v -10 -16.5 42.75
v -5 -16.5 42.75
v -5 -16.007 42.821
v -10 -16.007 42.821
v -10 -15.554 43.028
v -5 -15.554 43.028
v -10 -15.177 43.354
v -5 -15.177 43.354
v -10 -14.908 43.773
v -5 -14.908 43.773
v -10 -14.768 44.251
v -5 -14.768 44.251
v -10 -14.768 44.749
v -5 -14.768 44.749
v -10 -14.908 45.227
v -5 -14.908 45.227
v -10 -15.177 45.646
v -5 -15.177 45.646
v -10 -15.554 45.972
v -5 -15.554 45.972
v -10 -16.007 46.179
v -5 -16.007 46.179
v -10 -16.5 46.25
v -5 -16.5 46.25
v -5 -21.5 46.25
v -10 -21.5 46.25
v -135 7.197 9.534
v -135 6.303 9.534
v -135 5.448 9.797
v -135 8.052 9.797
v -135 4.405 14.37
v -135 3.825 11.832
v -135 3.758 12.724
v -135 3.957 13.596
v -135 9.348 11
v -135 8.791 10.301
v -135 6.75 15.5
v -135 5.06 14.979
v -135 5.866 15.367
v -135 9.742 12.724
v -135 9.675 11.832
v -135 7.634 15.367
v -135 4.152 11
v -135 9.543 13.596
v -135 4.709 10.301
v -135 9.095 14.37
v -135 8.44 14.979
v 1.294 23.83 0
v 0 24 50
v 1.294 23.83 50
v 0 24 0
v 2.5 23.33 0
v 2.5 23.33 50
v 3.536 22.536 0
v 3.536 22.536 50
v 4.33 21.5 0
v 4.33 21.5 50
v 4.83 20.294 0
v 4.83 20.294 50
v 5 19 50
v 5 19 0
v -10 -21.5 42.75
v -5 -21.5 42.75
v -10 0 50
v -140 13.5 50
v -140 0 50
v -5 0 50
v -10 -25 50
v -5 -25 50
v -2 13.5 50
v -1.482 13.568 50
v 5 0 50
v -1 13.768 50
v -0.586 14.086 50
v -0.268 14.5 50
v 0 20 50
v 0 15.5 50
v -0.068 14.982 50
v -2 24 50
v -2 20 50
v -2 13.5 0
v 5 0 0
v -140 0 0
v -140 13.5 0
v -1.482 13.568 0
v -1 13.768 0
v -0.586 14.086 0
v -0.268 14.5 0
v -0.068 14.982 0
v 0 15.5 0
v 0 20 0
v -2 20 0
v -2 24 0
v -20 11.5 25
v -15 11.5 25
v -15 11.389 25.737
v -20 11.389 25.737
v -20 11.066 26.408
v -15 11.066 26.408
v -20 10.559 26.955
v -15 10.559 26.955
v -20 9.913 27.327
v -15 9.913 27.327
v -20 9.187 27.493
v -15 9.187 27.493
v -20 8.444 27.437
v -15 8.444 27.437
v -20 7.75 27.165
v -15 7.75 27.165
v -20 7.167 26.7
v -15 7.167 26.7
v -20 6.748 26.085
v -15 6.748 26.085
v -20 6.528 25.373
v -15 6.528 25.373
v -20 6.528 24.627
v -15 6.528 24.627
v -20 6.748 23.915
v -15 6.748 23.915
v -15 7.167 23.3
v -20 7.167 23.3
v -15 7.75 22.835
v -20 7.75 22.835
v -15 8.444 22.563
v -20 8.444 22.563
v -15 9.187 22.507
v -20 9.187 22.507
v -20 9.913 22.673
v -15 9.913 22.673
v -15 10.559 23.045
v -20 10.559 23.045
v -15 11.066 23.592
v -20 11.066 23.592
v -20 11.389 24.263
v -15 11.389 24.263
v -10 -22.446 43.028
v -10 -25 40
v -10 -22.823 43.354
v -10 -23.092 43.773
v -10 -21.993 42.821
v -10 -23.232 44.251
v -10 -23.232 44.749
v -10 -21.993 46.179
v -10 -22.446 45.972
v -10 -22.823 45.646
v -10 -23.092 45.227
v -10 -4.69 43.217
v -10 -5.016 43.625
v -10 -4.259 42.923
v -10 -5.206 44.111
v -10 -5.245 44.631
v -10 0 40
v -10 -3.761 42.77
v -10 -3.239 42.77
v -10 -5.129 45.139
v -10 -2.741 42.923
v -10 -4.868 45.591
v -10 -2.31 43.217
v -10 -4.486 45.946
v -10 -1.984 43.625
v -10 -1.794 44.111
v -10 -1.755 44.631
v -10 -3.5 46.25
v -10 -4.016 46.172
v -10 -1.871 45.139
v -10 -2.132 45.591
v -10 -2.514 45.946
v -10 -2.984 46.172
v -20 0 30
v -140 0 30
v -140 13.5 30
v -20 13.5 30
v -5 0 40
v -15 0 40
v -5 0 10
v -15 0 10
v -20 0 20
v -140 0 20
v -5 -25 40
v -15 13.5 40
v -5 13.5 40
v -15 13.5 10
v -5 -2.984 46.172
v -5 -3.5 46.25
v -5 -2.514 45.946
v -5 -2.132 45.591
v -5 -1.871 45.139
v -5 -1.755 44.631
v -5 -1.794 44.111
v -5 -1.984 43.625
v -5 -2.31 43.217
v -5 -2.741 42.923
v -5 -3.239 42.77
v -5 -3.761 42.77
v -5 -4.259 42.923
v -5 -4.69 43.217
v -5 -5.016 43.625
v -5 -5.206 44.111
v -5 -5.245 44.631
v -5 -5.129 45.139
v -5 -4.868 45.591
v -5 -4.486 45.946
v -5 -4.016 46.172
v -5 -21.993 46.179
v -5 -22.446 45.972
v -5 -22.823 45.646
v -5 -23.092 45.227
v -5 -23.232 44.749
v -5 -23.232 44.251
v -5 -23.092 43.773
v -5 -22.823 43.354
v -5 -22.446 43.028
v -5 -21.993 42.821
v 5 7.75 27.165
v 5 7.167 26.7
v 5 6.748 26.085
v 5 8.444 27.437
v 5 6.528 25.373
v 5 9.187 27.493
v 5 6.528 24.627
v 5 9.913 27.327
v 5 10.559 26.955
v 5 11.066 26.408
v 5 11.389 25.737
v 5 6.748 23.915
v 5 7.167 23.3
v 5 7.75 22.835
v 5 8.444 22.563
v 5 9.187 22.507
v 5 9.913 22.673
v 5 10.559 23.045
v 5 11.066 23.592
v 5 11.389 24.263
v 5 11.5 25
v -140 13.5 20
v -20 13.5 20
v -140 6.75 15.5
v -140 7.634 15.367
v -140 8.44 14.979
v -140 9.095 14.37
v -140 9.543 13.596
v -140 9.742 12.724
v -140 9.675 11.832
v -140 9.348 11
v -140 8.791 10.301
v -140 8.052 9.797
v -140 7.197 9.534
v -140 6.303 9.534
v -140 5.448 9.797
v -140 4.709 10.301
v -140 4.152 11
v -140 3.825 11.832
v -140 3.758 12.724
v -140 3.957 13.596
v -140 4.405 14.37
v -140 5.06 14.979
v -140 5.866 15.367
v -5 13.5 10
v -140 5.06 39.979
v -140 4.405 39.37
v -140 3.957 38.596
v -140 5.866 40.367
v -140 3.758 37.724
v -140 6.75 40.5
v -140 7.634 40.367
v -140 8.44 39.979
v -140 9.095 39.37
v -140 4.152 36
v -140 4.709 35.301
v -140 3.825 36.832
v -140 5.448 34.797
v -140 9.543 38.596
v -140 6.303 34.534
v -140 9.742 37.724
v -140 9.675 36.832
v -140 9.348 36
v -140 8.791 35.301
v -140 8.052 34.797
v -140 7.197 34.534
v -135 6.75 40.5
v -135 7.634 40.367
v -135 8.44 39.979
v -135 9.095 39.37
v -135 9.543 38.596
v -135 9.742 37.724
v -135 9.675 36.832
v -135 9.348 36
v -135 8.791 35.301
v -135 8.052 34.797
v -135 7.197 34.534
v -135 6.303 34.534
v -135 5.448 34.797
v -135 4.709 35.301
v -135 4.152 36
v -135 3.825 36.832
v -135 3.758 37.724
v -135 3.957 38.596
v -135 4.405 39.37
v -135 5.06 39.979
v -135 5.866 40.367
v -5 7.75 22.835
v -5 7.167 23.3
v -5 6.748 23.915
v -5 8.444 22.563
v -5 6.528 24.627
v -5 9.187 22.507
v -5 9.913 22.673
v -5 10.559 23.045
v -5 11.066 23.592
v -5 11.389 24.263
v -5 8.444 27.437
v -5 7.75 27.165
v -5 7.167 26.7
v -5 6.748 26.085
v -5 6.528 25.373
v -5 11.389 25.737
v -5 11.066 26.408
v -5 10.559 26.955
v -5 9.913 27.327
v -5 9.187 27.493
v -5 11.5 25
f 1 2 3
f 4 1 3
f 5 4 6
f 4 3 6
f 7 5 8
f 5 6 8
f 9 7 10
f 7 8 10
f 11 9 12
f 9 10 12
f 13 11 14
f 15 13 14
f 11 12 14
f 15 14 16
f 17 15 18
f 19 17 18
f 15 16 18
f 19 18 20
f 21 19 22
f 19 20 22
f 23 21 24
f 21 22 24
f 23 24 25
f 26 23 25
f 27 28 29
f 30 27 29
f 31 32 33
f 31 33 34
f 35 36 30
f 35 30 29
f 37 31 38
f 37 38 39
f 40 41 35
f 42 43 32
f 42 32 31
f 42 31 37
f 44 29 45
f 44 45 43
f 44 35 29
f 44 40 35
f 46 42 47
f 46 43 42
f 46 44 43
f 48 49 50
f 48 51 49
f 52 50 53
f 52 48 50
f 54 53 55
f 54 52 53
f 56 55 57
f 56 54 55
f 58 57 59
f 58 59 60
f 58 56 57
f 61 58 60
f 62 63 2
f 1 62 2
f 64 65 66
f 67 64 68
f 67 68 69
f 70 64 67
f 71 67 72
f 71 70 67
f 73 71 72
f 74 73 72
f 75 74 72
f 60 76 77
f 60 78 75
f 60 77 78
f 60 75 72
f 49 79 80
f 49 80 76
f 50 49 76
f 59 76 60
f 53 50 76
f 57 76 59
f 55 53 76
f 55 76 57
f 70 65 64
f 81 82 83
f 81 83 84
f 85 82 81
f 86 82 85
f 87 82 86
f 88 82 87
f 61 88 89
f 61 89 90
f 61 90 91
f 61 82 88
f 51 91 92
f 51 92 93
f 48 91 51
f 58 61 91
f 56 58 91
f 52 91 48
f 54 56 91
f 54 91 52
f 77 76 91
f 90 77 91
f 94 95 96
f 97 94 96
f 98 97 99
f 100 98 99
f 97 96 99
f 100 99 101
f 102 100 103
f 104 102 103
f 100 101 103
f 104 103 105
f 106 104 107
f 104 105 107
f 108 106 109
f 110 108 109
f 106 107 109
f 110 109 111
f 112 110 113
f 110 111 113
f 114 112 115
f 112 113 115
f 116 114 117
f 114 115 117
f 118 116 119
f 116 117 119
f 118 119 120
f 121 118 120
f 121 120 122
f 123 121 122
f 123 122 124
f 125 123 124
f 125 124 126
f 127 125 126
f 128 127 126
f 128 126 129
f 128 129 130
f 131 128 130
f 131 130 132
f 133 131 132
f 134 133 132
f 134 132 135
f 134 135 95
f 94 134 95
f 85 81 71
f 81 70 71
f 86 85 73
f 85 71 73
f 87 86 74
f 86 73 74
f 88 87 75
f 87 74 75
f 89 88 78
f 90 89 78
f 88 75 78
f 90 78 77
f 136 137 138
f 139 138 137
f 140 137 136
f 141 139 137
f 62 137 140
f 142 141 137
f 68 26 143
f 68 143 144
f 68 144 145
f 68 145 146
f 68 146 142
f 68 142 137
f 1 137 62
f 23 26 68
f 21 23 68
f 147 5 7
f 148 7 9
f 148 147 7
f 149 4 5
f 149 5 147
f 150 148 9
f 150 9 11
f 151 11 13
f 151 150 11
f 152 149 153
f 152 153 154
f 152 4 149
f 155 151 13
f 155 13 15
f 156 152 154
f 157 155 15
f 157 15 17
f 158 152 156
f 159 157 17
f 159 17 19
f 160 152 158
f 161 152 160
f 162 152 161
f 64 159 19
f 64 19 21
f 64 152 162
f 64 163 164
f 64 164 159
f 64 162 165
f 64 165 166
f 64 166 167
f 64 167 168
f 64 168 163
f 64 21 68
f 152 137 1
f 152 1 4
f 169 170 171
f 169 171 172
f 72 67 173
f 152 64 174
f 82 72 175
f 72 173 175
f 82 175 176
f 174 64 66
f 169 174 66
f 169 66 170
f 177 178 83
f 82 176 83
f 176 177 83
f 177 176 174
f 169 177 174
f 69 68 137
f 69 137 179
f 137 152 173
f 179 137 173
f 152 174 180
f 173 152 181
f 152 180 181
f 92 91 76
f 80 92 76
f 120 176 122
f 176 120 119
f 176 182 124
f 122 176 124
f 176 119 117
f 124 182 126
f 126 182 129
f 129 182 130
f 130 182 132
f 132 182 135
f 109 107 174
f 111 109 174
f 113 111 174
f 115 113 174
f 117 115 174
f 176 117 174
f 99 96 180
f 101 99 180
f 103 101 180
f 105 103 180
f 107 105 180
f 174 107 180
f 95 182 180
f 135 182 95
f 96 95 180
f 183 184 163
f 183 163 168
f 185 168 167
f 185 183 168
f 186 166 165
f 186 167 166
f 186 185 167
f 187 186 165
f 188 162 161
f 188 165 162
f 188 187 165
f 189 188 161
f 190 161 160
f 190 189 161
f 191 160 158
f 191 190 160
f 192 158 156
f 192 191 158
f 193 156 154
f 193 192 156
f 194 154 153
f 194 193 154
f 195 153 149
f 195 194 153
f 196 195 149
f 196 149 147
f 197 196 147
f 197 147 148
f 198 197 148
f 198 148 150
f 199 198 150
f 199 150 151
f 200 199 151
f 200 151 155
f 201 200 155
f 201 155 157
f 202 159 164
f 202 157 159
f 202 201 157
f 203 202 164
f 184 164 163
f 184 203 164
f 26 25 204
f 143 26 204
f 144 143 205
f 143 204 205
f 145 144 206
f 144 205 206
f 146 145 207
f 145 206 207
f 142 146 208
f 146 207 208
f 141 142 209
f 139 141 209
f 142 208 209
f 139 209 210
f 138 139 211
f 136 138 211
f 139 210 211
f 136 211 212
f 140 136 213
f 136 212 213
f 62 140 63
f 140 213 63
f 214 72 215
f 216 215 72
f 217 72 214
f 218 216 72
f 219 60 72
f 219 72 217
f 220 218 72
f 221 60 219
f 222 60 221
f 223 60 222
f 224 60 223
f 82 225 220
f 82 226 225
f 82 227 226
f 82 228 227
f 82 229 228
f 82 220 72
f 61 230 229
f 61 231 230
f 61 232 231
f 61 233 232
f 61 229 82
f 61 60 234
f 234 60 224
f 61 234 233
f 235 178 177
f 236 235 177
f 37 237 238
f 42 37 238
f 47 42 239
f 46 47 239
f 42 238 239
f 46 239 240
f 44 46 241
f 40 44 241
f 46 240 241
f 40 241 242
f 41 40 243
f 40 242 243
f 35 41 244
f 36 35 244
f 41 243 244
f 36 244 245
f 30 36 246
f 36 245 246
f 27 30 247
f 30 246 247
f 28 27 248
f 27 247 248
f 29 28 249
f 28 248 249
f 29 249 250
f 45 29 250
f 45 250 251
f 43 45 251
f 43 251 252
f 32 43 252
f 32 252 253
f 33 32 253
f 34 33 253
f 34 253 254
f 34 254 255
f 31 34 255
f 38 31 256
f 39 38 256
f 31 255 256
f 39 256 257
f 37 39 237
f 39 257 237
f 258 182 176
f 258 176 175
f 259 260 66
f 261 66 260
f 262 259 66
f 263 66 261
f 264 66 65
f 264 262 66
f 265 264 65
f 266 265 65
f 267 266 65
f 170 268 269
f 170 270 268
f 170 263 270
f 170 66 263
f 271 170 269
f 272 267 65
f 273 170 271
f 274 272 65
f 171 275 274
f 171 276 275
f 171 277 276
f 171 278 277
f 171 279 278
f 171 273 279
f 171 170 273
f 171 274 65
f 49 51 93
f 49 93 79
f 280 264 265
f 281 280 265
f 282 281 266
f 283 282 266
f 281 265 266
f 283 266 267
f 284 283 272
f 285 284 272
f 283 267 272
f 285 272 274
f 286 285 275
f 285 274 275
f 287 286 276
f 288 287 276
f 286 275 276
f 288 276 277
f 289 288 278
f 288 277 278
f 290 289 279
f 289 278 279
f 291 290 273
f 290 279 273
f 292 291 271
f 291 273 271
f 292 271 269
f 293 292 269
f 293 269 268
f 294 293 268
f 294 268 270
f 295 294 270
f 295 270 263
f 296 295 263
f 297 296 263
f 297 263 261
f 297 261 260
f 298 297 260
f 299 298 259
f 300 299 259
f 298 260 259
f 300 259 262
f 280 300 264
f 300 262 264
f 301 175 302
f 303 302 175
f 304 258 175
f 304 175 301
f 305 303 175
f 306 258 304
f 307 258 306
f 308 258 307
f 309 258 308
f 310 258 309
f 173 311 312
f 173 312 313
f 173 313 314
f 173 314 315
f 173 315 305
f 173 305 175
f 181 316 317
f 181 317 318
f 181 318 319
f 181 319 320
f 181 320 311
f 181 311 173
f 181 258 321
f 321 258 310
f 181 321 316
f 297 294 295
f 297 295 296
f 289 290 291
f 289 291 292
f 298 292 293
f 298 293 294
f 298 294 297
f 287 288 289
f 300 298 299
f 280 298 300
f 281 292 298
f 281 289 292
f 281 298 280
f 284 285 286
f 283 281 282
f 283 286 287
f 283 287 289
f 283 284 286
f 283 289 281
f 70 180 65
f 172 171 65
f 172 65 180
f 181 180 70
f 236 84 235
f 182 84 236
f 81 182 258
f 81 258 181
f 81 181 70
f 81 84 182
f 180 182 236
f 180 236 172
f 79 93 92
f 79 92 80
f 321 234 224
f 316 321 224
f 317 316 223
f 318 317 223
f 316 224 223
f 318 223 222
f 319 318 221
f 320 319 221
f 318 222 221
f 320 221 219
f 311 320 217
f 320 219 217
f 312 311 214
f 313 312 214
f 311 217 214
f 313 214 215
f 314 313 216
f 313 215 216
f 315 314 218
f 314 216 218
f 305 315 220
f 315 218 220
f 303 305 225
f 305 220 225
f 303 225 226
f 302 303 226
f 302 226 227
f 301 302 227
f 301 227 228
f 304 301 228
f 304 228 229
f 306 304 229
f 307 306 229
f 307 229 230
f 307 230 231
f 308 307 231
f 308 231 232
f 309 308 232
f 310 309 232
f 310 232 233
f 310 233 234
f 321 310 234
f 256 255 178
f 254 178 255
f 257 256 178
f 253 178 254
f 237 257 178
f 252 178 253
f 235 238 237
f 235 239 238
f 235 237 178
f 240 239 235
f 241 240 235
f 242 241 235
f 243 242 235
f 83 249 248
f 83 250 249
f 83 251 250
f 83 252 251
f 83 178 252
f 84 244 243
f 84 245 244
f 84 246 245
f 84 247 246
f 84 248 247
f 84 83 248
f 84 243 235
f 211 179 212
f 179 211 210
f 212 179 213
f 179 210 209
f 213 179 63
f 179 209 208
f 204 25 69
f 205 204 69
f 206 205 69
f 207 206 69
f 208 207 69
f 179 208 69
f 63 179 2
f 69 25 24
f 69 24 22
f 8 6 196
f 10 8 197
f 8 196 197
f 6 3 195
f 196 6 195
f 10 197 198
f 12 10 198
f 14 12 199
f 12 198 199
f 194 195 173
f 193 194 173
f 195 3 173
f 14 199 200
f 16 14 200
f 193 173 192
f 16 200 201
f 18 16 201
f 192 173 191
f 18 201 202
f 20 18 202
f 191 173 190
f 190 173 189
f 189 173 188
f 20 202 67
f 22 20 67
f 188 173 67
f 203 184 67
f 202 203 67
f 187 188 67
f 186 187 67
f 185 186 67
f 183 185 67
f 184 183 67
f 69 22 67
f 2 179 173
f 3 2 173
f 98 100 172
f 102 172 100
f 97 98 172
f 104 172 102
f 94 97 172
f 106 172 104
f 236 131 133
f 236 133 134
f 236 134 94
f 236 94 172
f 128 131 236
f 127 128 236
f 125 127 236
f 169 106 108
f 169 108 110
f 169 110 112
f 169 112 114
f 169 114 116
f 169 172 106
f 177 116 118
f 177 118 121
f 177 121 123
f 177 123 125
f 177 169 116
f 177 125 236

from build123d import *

# Parameters (mm, degrees)
SKETCH1_W               = 140
SKETCH1_H               = 13.5
BOSS_EXTRUDE1_DEPTH     = 50
SKETCH2_R               = 3
CUT_EXTRUDE1_DEPTH      = 5
SKETCH3_W               = 50
SKETCH3_H               = 24
BOSS_EXTRUDE2_DEPTH     = 5
CUT_EXTRUDE2_DEPTH      = 151.585523873
CUT_EXTRUDE2_DEPTH_BACK = 151.585523873
SKETCH4_W               = 10
SKETCH4_H               = 30
SKETCH5_R               = 2.5
CUT_EXTRUDE3_DEPTH      = 35
SKETCH6_W               = 50
SKETCH6_H               = 4
BOSS_EXTRUDE3_DEPTH     = 2
CUT_EXTRUDE4_DEPTH      = 150.272402004
CUT_EXTRUDE4_DEPTH_BACK = 150.272402004
SKETCH7_W               = 120
SKETCH7_H               = 10
SKETCH8_W               = 5
SKETCH8_H               = 10
BOSS_EXTRUDE4_DEPTH     = 25
CUT_EXTRUDE5_DEPTH      = 142.509716981
CUT_EXTRUDE5_DEPTH_BACK = 142.509716981
SKETCH10_R              = 1.75
FILLET1_R               = 2
FILLET2_R               = 5


with BuildPart() as part:
    # Sketch1 → Boss-Extrude1 (new body)
    with BuildSketch(Plane.XY):
        with Locations((-70, 6.75)):
            Rectangle(SKETCH1_W, SKETCH1_H)
    extrude(amount=BOSS_EXTRUDE1_DEPTH)

    # Sketch2 → Cut-Extrude1 (cut)
    with BuildSketch(Plane.ZY.offset(140)):
        with Locations((12.5, 6.75)):
            Circle(SKETCH2_R)
        with Locations((25, 6.75)):
            Circle(SKETCH2_R)
        with Locations((37.5, 6.75)):
            Circle(SKETCH2_R)
    extrude(amount=-CUT_EXTRUDE1_DEPTH, mode=Mode.SUBTRACT)

    # Sketch3 → Boss-Extrude2 (add)
    with BuildSketch(Plane(origin=(0, 0, 0), x_dir=(0, 0, -1), z_dir=(1, 0, 0))):
        with Locations((-25, 12)):
            Rectangle(SKETCH3_W, SKETCH3_H)
    extrude(amount=BOSS_EXTRUDE2_DEPTH)

    # Sketch4 → Cut-Extrude2 (cut, two sides: drawn at the far end of the back side and taken through both)
    with BuildSketch(Plane.XZ.offset(-CUT_EXTRUDE2_DEPTH_BACK)):
        with Locations((-10, 25)):
            Rectangle(SKETCH4_W, SKETCH4_H)
    extrude(amount=CUT_EXTRUDE2_DEPTH + CUT_EXTRUDE2_DEPTH_BACK, mode=Mode.SUBTRACT)

    # Sketch5 → Cut-Extrude3 (cut)
    with BuildSketch(Plane(origin=(5, 0, 0), x_dir=(0, 0, -1), z_dir=(1, 0, 0))):
        with Locations(Location((-25, 9, 0), (0, 0, 90))):
            Circle(SKETCH5_R)
    extrude(amount=-CUT_EXTRUDE3_DEPTH, mode=Mode.SUBTRACT)

    # Sketch6 → Boss-Extrude3 (add)
    with BuildSketch(Plane.ZY):
        with Locations((25, 22)):
            Rectangle(SKETCH6_W, SKETCH6_H)
    extrude(amount=BOSS_EXTRUDE3_DEPTH)

    # Sketch7 → Cut-Extrude4 (cut, two sides: drawn at the far end of the back side and taken through both)
    with BuildSketch(Plane(origin=(0, 13.5, 0), x_dir=(1, 0, 0), z_dir=(0, 1, 0)).offset(-CUT_EXTRUDE4_DEPTH_BACK)):
        with Locations((-80, -25)):
            Rectangle(SKETCH7_W, SKETCH7_H)
    extrude(amount=CUT_EXTRUDE4_DEPTH + CUT_EXTRUDE4_DEPTH_BACK, mode=Mode.SUBTRACT)

    # Sketch8 → Boss-Extrude4 (add)
    with BuildSketch(Plane.XZ):
        with Locations((-7.5, 45)):
            Rectangle(SKETCH8_W, SKETCH8_H)
    extrude(amount=BOSS_EXTRUDE4_DEPTH)

    # Sketch10 → Cut-Extrude5 (cut, two sides: drawn at the far end of the back side and taken through both)
    with BuildSketch(Plane.ZY.offset(10).offset(-CUT_EXTRUDE5_DEPTH_BACK)):
        with Locations((44.5, -3.5)):
            Circle(SKETCH10_R)
        with BuildLine():
            Line((46.25, -16.5), (46.25, -21.5))
            ThreePointArc((46.25, -21.5), (44.5, -23.25), (42.75, -21.5))
            Line((42.75, -21.5), (42.75, -16.5))
            ThreePointArc((42.75, -16.5), (44.5, -14.75), (46.25, -16.5))
        make_face()
    extrude(amount=CUT_EXTRUDE5_DEPTH + CUT_EXTRUDE5_DEPTH_BACK, mode=Mode.SUBTRACT)

    # Fillet1
    fillet1_edges = [part.edges().sort_by_distance(p)[0] for p in [
        (0, 13.5, 25),
    ]]
    fillet(fillet1_edges, radius=FILLET1_R)

    # Fillet2
    fillet2_edges = [part.edges().sort_by_distance(p)[0] for p in [
        (5, 24, 25),
    ]]
    fillet(fillet2_edges, radius=FILLET2_R)


solid = part.part
